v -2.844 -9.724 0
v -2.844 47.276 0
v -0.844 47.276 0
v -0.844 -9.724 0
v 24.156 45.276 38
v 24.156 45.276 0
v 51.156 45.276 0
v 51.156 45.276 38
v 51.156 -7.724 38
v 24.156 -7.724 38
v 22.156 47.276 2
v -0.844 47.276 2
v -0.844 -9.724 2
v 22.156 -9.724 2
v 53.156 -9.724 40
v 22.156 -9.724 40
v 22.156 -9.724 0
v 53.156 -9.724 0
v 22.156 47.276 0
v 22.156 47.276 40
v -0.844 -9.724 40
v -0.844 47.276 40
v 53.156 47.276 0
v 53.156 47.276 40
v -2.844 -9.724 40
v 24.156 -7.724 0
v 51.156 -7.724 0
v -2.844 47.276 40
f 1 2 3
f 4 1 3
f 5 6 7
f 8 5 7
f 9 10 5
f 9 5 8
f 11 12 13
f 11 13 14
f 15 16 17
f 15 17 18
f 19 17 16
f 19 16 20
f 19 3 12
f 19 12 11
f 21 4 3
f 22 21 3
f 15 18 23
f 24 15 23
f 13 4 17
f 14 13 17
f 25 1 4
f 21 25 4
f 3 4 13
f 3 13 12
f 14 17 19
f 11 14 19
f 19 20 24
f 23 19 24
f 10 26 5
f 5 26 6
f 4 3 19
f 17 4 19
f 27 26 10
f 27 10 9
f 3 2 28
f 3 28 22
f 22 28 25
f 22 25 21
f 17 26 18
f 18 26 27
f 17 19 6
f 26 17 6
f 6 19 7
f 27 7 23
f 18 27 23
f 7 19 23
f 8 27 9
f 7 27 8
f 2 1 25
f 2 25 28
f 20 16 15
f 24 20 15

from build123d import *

# Parameters (mm, degrees)
F0_W     = 2
F0_H     = 57
F0_W_2   = 31
F0_W_3   = 27
F0_H_2   = 53
F1_DEPTH = 40
F0_W_4   = 23
F2_DEPTH = 2
F3_DEPTH = 40
F4_DEPTH = 38


with BuildPart() as f1:
    # F0 (on Top) → F1 (new body)
    with BuildSketch(Plane.XY):
        with Locations((-1.844285, 18.77621)):
            Rectangle(F0_W, F0_H)
        with Locations((37.655715, 18.77621)):
            Rectangle(F0_W_2, F0_H)
        with Locations((37.655715, 18.77621)):
            Rectangle(F0_W_3, F0_H_2, mode=Mode.SUBTRACT)
    extrude(amount=F1_DEPTH)

    # F0 (on Top) → F3 (join)
    with BuildSketch(Plane.XY):
        with Locations((37.655715, 18.77621)):
            Rectangle(F0_W_3, F0_H_2)
    extrude(amount=F3_DEPTH)

    # F0 (on Top) → F4 (cut)
    with BuildSketch(Plane.XY):
        with Locations((37.655715, 18.77621)):
            Rectangle(F0_W_3, F0_H_2)
    extrude(amount=F4_DEPTH, mode=Mode.SUBTRACT)


with BuildPart() as f2:
    # F0 (on Top) → F2 (new body)
    with BuildSketch(Plane.XY):
        with Locations((10.655715, 18.77621)):
            Rectangle(F0_W_4, F0_H)
    extrude(amount=F2_DEPTH)


solid = Compound([f1.part, f2.part])
